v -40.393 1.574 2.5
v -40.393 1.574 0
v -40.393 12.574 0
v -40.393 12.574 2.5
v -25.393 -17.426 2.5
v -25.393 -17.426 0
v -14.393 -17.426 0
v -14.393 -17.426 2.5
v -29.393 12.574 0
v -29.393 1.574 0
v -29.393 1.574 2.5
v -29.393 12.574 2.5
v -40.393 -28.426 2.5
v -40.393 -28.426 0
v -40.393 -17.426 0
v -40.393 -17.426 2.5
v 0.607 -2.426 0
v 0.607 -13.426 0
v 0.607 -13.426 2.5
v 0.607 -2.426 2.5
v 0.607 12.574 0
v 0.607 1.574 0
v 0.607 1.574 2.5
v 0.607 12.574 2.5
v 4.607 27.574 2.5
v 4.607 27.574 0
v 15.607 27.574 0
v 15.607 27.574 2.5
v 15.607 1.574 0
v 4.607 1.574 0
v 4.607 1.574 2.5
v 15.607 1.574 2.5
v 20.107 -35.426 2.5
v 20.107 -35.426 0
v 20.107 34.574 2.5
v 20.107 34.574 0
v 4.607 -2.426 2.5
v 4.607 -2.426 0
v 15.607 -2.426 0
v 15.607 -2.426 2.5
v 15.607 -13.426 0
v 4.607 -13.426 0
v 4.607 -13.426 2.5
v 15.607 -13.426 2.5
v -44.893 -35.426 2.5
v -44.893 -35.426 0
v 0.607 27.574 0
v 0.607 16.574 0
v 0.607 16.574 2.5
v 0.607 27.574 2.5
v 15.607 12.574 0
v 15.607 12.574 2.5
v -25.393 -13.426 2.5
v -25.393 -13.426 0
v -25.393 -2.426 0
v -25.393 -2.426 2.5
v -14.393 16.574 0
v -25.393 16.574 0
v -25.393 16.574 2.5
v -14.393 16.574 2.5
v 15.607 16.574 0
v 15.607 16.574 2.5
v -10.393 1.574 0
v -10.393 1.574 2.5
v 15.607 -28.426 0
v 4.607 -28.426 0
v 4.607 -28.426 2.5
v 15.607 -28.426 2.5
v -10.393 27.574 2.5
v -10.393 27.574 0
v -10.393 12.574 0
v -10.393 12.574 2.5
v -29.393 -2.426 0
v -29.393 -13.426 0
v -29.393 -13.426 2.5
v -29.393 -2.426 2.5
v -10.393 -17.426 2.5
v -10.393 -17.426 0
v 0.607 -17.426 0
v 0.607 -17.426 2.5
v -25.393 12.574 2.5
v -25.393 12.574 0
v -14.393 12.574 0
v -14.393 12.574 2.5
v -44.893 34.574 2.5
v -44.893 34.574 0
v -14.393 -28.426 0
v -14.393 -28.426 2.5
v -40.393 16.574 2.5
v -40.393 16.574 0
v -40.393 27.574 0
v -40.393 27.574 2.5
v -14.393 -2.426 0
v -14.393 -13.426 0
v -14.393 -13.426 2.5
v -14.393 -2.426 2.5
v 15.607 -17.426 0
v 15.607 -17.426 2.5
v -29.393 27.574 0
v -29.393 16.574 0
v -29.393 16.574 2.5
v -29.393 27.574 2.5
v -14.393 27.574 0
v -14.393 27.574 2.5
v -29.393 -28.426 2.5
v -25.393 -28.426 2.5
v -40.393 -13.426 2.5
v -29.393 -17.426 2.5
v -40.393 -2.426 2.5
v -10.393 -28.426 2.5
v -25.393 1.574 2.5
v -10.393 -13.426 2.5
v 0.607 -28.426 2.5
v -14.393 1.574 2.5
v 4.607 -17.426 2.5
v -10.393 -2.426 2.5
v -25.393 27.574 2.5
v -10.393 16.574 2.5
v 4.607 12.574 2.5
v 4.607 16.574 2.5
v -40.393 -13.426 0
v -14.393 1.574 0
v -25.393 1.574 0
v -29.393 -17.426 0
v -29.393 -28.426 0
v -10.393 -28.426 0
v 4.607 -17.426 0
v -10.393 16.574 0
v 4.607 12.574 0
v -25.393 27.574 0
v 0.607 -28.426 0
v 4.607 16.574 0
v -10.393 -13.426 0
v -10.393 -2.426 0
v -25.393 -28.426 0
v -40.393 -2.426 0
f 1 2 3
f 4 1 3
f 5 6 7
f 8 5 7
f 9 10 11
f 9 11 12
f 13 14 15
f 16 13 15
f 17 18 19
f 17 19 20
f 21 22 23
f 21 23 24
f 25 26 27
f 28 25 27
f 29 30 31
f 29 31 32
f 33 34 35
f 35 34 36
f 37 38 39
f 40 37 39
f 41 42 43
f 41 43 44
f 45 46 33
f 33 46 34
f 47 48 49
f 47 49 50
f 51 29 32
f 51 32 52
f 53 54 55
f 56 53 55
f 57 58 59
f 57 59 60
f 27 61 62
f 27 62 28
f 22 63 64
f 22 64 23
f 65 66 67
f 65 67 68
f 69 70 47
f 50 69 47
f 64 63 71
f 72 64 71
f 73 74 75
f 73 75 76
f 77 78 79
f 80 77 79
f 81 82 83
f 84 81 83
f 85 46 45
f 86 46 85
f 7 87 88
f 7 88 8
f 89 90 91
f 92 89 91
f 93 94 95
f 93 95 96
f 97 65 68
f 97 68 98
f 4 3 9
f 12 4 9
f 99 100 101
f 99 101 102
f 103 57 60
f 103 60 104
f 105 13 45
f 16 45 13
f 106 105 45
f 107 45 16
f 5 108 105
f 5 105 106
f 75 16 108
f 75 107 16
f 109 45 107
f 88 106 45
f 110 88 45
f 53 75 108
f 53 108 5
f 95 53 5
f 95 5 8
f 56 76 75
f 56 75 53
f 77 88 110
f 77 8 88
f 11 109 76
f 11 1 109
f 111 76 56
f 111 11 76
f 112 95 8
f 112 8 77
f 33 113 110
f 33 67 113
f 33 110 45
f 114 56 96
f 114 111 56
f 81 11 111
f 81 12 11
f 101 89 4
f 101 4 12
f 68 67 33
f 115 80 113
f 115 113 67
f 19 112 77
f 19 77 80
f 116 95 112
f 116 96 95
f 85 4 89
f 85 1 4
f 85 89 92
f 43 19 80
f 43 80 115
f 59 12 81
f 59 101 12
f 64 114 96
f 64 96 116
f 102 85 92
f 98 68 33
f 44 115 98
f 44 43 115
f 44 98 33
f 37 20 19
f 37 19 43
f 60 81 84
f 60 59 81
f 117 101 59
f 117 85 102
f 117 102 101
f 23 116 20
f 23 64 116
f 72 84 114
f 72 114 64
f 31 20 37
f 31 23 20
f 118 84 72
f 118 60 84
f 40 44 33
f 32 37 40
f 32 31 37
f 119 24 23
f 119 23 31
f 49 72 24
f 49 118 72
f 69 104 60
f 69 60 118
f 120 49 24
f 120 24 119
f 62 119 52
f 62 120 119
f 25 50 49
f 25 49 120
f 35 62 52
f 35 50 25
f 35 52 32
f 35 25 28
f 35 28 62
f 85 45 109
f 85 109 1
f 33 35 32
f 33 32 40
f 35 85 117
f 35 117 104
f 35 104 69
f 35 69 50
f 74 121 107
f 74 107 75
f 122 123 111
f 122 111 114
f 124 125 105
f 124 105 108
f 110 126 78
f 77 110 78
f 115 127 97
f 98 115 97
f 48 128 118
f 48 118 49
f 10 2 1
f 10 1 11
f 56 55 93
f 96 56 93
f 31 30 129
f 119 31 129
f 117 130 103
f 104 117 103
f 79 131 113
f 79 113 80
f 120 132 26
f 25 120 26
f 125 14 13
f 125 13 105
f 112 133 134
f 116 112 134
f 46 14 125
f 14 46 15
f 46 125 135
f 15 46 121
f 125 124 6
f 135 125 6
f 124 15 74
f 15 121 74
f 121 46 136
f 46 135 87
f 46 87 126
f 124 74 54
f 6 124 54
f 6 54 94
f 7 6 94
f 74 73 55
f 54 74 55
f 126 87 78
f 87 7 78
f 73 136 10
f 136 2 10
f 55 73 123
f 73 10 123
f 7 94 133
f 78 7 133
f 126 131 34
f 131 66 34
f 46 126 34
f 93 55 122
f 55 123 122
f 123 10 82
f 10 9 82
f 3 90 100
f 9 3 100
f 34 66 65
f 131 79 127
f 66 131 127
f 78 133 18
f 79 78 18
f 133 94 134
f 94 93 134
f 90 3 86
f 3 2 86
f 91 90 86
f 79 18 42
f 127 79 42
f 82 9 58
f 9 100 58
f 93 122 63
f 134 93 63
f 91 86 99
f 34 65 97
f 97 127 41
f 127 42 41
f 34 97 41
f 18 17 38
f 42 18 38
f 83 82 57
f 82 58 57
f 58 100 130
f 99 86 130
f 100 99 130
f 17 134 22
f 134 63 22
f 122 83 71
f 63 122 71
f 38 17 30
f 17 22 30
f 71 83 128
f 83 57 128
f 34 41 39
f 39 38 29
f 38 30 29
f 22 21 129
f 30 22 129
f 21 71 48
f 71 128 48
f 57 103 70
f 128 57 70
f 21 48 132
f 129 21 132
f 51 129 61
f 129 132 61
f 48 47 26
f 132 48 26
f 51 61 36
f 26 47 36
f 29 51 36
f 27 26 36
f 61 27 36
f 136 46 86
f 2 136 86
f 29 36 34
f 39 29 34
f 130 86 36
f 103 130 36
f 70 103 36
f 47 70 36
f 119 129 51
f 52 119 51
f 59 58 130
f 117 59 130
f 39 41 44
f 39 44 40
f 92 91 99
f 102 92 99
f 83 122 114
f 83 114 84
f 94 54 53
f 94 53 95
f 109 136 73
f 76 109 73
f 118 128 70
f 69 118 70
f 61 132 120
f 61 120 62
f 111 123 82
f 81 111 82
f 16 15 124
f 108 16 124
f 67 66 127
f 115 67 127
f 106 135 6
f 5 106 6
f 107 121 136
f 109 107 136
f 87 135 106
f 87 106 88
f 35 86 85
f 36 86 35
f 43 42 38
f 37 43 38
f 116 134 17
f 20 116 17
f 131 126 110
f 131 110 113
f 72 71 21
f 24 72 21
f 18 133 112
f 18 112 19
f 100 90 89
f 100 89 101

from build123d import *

# Parameters (mm, degrees)
F0_W     = 65
F0_H     = 70
F0_W_2   = 11
F0_H_2   = 11
F1_DEPTH = 2.5


with BuildPart() as f1:
    # F0 (on Top) → F1 (new body)
    with BuildSketch(Plane.XY):
        with Locations((-12.392649, -0.425882)):
            Rectangle(F0_W, F0_H)
        with Locations((-34.892649, -22.925882)):
            Rectangle(F0_W_2, F0_H_2, mode=Mode.SUBTRACT)
        with Locations((-19.892649, -22.925882)):
            Rectangle(F0_W_2, F0_H_2, mode=Mode.SUBTRACT)
        with Locations((-34.892649, -7.925882)):
            Rectangle(F0_W_2, F0_H_2, mode=Mode.SUBTRACT)
        with Locations((-19.892649, -7.925882)):
            Rectangle(F0_W_2, F0_H_2, mode=Mode.SUBTRACT)
        with Locations((-4.892649, -22.925882)):
            Rectangle(F0_W_2, F0_H_2, mode=Mode.SUBTRACT)
        with Locations((10.107351, -22.925882)):
            Rectangle(F0_W_2, F0_H_2, mode=Mode.SUBTRACT)
        with Locations((-4.892649, -7.925882)):
            Rectangle(F0_W_2, F0_H_2, mode=Mode.SUBTRACT)
        with Locations((10.107351, -7.925882)):
            Rectangle(F0_W_2, F0_H_2, mode=Mode.SUBTRACT)
        with Locations((-34.892649, 7.074118)):
            Rectangle(F0_W_2, F0_H_2, mode=Mode.SUBTRACT)
        with Locations((-19.892649, 7.074118)):
            Rectangle(F0_W_2, F0_H_2, mode=Mode.SUBTRACT)
        with Locations((-34.892649, 22.074118)):
            Rectangle(F0_W_2, F0_H_2, mode=Mode.SUBTRACT)
        with Locations((-19.892649, 22.074118)):
            Rectangle(F0_W_2, F0_H_2, mode=Mode.SUBTRACT)
        with Locations((-4.892649, 7.074118)):
            Rectangle(F0_W_2, F0_H_2, mode=Mode.SUBTRACT)
        with Locations((10.107351, 7.074118)):
            Rectangle(F0_W_2, F0_H_2, mode=Mode.SUBTRACT)
        with Locations((-4.892649, 22.074118)):
            Rectangle(F0_W_2, F0_H_2, mode=Mode.SUBTRACT)
        with Locations((10.107351, 22.074118)):
            Rectangle(F0_W_2, F0_H_2, mode=Mode.SUBTRACT)
    extrude(amount=F1_DEPTH)


solid = f1.part
